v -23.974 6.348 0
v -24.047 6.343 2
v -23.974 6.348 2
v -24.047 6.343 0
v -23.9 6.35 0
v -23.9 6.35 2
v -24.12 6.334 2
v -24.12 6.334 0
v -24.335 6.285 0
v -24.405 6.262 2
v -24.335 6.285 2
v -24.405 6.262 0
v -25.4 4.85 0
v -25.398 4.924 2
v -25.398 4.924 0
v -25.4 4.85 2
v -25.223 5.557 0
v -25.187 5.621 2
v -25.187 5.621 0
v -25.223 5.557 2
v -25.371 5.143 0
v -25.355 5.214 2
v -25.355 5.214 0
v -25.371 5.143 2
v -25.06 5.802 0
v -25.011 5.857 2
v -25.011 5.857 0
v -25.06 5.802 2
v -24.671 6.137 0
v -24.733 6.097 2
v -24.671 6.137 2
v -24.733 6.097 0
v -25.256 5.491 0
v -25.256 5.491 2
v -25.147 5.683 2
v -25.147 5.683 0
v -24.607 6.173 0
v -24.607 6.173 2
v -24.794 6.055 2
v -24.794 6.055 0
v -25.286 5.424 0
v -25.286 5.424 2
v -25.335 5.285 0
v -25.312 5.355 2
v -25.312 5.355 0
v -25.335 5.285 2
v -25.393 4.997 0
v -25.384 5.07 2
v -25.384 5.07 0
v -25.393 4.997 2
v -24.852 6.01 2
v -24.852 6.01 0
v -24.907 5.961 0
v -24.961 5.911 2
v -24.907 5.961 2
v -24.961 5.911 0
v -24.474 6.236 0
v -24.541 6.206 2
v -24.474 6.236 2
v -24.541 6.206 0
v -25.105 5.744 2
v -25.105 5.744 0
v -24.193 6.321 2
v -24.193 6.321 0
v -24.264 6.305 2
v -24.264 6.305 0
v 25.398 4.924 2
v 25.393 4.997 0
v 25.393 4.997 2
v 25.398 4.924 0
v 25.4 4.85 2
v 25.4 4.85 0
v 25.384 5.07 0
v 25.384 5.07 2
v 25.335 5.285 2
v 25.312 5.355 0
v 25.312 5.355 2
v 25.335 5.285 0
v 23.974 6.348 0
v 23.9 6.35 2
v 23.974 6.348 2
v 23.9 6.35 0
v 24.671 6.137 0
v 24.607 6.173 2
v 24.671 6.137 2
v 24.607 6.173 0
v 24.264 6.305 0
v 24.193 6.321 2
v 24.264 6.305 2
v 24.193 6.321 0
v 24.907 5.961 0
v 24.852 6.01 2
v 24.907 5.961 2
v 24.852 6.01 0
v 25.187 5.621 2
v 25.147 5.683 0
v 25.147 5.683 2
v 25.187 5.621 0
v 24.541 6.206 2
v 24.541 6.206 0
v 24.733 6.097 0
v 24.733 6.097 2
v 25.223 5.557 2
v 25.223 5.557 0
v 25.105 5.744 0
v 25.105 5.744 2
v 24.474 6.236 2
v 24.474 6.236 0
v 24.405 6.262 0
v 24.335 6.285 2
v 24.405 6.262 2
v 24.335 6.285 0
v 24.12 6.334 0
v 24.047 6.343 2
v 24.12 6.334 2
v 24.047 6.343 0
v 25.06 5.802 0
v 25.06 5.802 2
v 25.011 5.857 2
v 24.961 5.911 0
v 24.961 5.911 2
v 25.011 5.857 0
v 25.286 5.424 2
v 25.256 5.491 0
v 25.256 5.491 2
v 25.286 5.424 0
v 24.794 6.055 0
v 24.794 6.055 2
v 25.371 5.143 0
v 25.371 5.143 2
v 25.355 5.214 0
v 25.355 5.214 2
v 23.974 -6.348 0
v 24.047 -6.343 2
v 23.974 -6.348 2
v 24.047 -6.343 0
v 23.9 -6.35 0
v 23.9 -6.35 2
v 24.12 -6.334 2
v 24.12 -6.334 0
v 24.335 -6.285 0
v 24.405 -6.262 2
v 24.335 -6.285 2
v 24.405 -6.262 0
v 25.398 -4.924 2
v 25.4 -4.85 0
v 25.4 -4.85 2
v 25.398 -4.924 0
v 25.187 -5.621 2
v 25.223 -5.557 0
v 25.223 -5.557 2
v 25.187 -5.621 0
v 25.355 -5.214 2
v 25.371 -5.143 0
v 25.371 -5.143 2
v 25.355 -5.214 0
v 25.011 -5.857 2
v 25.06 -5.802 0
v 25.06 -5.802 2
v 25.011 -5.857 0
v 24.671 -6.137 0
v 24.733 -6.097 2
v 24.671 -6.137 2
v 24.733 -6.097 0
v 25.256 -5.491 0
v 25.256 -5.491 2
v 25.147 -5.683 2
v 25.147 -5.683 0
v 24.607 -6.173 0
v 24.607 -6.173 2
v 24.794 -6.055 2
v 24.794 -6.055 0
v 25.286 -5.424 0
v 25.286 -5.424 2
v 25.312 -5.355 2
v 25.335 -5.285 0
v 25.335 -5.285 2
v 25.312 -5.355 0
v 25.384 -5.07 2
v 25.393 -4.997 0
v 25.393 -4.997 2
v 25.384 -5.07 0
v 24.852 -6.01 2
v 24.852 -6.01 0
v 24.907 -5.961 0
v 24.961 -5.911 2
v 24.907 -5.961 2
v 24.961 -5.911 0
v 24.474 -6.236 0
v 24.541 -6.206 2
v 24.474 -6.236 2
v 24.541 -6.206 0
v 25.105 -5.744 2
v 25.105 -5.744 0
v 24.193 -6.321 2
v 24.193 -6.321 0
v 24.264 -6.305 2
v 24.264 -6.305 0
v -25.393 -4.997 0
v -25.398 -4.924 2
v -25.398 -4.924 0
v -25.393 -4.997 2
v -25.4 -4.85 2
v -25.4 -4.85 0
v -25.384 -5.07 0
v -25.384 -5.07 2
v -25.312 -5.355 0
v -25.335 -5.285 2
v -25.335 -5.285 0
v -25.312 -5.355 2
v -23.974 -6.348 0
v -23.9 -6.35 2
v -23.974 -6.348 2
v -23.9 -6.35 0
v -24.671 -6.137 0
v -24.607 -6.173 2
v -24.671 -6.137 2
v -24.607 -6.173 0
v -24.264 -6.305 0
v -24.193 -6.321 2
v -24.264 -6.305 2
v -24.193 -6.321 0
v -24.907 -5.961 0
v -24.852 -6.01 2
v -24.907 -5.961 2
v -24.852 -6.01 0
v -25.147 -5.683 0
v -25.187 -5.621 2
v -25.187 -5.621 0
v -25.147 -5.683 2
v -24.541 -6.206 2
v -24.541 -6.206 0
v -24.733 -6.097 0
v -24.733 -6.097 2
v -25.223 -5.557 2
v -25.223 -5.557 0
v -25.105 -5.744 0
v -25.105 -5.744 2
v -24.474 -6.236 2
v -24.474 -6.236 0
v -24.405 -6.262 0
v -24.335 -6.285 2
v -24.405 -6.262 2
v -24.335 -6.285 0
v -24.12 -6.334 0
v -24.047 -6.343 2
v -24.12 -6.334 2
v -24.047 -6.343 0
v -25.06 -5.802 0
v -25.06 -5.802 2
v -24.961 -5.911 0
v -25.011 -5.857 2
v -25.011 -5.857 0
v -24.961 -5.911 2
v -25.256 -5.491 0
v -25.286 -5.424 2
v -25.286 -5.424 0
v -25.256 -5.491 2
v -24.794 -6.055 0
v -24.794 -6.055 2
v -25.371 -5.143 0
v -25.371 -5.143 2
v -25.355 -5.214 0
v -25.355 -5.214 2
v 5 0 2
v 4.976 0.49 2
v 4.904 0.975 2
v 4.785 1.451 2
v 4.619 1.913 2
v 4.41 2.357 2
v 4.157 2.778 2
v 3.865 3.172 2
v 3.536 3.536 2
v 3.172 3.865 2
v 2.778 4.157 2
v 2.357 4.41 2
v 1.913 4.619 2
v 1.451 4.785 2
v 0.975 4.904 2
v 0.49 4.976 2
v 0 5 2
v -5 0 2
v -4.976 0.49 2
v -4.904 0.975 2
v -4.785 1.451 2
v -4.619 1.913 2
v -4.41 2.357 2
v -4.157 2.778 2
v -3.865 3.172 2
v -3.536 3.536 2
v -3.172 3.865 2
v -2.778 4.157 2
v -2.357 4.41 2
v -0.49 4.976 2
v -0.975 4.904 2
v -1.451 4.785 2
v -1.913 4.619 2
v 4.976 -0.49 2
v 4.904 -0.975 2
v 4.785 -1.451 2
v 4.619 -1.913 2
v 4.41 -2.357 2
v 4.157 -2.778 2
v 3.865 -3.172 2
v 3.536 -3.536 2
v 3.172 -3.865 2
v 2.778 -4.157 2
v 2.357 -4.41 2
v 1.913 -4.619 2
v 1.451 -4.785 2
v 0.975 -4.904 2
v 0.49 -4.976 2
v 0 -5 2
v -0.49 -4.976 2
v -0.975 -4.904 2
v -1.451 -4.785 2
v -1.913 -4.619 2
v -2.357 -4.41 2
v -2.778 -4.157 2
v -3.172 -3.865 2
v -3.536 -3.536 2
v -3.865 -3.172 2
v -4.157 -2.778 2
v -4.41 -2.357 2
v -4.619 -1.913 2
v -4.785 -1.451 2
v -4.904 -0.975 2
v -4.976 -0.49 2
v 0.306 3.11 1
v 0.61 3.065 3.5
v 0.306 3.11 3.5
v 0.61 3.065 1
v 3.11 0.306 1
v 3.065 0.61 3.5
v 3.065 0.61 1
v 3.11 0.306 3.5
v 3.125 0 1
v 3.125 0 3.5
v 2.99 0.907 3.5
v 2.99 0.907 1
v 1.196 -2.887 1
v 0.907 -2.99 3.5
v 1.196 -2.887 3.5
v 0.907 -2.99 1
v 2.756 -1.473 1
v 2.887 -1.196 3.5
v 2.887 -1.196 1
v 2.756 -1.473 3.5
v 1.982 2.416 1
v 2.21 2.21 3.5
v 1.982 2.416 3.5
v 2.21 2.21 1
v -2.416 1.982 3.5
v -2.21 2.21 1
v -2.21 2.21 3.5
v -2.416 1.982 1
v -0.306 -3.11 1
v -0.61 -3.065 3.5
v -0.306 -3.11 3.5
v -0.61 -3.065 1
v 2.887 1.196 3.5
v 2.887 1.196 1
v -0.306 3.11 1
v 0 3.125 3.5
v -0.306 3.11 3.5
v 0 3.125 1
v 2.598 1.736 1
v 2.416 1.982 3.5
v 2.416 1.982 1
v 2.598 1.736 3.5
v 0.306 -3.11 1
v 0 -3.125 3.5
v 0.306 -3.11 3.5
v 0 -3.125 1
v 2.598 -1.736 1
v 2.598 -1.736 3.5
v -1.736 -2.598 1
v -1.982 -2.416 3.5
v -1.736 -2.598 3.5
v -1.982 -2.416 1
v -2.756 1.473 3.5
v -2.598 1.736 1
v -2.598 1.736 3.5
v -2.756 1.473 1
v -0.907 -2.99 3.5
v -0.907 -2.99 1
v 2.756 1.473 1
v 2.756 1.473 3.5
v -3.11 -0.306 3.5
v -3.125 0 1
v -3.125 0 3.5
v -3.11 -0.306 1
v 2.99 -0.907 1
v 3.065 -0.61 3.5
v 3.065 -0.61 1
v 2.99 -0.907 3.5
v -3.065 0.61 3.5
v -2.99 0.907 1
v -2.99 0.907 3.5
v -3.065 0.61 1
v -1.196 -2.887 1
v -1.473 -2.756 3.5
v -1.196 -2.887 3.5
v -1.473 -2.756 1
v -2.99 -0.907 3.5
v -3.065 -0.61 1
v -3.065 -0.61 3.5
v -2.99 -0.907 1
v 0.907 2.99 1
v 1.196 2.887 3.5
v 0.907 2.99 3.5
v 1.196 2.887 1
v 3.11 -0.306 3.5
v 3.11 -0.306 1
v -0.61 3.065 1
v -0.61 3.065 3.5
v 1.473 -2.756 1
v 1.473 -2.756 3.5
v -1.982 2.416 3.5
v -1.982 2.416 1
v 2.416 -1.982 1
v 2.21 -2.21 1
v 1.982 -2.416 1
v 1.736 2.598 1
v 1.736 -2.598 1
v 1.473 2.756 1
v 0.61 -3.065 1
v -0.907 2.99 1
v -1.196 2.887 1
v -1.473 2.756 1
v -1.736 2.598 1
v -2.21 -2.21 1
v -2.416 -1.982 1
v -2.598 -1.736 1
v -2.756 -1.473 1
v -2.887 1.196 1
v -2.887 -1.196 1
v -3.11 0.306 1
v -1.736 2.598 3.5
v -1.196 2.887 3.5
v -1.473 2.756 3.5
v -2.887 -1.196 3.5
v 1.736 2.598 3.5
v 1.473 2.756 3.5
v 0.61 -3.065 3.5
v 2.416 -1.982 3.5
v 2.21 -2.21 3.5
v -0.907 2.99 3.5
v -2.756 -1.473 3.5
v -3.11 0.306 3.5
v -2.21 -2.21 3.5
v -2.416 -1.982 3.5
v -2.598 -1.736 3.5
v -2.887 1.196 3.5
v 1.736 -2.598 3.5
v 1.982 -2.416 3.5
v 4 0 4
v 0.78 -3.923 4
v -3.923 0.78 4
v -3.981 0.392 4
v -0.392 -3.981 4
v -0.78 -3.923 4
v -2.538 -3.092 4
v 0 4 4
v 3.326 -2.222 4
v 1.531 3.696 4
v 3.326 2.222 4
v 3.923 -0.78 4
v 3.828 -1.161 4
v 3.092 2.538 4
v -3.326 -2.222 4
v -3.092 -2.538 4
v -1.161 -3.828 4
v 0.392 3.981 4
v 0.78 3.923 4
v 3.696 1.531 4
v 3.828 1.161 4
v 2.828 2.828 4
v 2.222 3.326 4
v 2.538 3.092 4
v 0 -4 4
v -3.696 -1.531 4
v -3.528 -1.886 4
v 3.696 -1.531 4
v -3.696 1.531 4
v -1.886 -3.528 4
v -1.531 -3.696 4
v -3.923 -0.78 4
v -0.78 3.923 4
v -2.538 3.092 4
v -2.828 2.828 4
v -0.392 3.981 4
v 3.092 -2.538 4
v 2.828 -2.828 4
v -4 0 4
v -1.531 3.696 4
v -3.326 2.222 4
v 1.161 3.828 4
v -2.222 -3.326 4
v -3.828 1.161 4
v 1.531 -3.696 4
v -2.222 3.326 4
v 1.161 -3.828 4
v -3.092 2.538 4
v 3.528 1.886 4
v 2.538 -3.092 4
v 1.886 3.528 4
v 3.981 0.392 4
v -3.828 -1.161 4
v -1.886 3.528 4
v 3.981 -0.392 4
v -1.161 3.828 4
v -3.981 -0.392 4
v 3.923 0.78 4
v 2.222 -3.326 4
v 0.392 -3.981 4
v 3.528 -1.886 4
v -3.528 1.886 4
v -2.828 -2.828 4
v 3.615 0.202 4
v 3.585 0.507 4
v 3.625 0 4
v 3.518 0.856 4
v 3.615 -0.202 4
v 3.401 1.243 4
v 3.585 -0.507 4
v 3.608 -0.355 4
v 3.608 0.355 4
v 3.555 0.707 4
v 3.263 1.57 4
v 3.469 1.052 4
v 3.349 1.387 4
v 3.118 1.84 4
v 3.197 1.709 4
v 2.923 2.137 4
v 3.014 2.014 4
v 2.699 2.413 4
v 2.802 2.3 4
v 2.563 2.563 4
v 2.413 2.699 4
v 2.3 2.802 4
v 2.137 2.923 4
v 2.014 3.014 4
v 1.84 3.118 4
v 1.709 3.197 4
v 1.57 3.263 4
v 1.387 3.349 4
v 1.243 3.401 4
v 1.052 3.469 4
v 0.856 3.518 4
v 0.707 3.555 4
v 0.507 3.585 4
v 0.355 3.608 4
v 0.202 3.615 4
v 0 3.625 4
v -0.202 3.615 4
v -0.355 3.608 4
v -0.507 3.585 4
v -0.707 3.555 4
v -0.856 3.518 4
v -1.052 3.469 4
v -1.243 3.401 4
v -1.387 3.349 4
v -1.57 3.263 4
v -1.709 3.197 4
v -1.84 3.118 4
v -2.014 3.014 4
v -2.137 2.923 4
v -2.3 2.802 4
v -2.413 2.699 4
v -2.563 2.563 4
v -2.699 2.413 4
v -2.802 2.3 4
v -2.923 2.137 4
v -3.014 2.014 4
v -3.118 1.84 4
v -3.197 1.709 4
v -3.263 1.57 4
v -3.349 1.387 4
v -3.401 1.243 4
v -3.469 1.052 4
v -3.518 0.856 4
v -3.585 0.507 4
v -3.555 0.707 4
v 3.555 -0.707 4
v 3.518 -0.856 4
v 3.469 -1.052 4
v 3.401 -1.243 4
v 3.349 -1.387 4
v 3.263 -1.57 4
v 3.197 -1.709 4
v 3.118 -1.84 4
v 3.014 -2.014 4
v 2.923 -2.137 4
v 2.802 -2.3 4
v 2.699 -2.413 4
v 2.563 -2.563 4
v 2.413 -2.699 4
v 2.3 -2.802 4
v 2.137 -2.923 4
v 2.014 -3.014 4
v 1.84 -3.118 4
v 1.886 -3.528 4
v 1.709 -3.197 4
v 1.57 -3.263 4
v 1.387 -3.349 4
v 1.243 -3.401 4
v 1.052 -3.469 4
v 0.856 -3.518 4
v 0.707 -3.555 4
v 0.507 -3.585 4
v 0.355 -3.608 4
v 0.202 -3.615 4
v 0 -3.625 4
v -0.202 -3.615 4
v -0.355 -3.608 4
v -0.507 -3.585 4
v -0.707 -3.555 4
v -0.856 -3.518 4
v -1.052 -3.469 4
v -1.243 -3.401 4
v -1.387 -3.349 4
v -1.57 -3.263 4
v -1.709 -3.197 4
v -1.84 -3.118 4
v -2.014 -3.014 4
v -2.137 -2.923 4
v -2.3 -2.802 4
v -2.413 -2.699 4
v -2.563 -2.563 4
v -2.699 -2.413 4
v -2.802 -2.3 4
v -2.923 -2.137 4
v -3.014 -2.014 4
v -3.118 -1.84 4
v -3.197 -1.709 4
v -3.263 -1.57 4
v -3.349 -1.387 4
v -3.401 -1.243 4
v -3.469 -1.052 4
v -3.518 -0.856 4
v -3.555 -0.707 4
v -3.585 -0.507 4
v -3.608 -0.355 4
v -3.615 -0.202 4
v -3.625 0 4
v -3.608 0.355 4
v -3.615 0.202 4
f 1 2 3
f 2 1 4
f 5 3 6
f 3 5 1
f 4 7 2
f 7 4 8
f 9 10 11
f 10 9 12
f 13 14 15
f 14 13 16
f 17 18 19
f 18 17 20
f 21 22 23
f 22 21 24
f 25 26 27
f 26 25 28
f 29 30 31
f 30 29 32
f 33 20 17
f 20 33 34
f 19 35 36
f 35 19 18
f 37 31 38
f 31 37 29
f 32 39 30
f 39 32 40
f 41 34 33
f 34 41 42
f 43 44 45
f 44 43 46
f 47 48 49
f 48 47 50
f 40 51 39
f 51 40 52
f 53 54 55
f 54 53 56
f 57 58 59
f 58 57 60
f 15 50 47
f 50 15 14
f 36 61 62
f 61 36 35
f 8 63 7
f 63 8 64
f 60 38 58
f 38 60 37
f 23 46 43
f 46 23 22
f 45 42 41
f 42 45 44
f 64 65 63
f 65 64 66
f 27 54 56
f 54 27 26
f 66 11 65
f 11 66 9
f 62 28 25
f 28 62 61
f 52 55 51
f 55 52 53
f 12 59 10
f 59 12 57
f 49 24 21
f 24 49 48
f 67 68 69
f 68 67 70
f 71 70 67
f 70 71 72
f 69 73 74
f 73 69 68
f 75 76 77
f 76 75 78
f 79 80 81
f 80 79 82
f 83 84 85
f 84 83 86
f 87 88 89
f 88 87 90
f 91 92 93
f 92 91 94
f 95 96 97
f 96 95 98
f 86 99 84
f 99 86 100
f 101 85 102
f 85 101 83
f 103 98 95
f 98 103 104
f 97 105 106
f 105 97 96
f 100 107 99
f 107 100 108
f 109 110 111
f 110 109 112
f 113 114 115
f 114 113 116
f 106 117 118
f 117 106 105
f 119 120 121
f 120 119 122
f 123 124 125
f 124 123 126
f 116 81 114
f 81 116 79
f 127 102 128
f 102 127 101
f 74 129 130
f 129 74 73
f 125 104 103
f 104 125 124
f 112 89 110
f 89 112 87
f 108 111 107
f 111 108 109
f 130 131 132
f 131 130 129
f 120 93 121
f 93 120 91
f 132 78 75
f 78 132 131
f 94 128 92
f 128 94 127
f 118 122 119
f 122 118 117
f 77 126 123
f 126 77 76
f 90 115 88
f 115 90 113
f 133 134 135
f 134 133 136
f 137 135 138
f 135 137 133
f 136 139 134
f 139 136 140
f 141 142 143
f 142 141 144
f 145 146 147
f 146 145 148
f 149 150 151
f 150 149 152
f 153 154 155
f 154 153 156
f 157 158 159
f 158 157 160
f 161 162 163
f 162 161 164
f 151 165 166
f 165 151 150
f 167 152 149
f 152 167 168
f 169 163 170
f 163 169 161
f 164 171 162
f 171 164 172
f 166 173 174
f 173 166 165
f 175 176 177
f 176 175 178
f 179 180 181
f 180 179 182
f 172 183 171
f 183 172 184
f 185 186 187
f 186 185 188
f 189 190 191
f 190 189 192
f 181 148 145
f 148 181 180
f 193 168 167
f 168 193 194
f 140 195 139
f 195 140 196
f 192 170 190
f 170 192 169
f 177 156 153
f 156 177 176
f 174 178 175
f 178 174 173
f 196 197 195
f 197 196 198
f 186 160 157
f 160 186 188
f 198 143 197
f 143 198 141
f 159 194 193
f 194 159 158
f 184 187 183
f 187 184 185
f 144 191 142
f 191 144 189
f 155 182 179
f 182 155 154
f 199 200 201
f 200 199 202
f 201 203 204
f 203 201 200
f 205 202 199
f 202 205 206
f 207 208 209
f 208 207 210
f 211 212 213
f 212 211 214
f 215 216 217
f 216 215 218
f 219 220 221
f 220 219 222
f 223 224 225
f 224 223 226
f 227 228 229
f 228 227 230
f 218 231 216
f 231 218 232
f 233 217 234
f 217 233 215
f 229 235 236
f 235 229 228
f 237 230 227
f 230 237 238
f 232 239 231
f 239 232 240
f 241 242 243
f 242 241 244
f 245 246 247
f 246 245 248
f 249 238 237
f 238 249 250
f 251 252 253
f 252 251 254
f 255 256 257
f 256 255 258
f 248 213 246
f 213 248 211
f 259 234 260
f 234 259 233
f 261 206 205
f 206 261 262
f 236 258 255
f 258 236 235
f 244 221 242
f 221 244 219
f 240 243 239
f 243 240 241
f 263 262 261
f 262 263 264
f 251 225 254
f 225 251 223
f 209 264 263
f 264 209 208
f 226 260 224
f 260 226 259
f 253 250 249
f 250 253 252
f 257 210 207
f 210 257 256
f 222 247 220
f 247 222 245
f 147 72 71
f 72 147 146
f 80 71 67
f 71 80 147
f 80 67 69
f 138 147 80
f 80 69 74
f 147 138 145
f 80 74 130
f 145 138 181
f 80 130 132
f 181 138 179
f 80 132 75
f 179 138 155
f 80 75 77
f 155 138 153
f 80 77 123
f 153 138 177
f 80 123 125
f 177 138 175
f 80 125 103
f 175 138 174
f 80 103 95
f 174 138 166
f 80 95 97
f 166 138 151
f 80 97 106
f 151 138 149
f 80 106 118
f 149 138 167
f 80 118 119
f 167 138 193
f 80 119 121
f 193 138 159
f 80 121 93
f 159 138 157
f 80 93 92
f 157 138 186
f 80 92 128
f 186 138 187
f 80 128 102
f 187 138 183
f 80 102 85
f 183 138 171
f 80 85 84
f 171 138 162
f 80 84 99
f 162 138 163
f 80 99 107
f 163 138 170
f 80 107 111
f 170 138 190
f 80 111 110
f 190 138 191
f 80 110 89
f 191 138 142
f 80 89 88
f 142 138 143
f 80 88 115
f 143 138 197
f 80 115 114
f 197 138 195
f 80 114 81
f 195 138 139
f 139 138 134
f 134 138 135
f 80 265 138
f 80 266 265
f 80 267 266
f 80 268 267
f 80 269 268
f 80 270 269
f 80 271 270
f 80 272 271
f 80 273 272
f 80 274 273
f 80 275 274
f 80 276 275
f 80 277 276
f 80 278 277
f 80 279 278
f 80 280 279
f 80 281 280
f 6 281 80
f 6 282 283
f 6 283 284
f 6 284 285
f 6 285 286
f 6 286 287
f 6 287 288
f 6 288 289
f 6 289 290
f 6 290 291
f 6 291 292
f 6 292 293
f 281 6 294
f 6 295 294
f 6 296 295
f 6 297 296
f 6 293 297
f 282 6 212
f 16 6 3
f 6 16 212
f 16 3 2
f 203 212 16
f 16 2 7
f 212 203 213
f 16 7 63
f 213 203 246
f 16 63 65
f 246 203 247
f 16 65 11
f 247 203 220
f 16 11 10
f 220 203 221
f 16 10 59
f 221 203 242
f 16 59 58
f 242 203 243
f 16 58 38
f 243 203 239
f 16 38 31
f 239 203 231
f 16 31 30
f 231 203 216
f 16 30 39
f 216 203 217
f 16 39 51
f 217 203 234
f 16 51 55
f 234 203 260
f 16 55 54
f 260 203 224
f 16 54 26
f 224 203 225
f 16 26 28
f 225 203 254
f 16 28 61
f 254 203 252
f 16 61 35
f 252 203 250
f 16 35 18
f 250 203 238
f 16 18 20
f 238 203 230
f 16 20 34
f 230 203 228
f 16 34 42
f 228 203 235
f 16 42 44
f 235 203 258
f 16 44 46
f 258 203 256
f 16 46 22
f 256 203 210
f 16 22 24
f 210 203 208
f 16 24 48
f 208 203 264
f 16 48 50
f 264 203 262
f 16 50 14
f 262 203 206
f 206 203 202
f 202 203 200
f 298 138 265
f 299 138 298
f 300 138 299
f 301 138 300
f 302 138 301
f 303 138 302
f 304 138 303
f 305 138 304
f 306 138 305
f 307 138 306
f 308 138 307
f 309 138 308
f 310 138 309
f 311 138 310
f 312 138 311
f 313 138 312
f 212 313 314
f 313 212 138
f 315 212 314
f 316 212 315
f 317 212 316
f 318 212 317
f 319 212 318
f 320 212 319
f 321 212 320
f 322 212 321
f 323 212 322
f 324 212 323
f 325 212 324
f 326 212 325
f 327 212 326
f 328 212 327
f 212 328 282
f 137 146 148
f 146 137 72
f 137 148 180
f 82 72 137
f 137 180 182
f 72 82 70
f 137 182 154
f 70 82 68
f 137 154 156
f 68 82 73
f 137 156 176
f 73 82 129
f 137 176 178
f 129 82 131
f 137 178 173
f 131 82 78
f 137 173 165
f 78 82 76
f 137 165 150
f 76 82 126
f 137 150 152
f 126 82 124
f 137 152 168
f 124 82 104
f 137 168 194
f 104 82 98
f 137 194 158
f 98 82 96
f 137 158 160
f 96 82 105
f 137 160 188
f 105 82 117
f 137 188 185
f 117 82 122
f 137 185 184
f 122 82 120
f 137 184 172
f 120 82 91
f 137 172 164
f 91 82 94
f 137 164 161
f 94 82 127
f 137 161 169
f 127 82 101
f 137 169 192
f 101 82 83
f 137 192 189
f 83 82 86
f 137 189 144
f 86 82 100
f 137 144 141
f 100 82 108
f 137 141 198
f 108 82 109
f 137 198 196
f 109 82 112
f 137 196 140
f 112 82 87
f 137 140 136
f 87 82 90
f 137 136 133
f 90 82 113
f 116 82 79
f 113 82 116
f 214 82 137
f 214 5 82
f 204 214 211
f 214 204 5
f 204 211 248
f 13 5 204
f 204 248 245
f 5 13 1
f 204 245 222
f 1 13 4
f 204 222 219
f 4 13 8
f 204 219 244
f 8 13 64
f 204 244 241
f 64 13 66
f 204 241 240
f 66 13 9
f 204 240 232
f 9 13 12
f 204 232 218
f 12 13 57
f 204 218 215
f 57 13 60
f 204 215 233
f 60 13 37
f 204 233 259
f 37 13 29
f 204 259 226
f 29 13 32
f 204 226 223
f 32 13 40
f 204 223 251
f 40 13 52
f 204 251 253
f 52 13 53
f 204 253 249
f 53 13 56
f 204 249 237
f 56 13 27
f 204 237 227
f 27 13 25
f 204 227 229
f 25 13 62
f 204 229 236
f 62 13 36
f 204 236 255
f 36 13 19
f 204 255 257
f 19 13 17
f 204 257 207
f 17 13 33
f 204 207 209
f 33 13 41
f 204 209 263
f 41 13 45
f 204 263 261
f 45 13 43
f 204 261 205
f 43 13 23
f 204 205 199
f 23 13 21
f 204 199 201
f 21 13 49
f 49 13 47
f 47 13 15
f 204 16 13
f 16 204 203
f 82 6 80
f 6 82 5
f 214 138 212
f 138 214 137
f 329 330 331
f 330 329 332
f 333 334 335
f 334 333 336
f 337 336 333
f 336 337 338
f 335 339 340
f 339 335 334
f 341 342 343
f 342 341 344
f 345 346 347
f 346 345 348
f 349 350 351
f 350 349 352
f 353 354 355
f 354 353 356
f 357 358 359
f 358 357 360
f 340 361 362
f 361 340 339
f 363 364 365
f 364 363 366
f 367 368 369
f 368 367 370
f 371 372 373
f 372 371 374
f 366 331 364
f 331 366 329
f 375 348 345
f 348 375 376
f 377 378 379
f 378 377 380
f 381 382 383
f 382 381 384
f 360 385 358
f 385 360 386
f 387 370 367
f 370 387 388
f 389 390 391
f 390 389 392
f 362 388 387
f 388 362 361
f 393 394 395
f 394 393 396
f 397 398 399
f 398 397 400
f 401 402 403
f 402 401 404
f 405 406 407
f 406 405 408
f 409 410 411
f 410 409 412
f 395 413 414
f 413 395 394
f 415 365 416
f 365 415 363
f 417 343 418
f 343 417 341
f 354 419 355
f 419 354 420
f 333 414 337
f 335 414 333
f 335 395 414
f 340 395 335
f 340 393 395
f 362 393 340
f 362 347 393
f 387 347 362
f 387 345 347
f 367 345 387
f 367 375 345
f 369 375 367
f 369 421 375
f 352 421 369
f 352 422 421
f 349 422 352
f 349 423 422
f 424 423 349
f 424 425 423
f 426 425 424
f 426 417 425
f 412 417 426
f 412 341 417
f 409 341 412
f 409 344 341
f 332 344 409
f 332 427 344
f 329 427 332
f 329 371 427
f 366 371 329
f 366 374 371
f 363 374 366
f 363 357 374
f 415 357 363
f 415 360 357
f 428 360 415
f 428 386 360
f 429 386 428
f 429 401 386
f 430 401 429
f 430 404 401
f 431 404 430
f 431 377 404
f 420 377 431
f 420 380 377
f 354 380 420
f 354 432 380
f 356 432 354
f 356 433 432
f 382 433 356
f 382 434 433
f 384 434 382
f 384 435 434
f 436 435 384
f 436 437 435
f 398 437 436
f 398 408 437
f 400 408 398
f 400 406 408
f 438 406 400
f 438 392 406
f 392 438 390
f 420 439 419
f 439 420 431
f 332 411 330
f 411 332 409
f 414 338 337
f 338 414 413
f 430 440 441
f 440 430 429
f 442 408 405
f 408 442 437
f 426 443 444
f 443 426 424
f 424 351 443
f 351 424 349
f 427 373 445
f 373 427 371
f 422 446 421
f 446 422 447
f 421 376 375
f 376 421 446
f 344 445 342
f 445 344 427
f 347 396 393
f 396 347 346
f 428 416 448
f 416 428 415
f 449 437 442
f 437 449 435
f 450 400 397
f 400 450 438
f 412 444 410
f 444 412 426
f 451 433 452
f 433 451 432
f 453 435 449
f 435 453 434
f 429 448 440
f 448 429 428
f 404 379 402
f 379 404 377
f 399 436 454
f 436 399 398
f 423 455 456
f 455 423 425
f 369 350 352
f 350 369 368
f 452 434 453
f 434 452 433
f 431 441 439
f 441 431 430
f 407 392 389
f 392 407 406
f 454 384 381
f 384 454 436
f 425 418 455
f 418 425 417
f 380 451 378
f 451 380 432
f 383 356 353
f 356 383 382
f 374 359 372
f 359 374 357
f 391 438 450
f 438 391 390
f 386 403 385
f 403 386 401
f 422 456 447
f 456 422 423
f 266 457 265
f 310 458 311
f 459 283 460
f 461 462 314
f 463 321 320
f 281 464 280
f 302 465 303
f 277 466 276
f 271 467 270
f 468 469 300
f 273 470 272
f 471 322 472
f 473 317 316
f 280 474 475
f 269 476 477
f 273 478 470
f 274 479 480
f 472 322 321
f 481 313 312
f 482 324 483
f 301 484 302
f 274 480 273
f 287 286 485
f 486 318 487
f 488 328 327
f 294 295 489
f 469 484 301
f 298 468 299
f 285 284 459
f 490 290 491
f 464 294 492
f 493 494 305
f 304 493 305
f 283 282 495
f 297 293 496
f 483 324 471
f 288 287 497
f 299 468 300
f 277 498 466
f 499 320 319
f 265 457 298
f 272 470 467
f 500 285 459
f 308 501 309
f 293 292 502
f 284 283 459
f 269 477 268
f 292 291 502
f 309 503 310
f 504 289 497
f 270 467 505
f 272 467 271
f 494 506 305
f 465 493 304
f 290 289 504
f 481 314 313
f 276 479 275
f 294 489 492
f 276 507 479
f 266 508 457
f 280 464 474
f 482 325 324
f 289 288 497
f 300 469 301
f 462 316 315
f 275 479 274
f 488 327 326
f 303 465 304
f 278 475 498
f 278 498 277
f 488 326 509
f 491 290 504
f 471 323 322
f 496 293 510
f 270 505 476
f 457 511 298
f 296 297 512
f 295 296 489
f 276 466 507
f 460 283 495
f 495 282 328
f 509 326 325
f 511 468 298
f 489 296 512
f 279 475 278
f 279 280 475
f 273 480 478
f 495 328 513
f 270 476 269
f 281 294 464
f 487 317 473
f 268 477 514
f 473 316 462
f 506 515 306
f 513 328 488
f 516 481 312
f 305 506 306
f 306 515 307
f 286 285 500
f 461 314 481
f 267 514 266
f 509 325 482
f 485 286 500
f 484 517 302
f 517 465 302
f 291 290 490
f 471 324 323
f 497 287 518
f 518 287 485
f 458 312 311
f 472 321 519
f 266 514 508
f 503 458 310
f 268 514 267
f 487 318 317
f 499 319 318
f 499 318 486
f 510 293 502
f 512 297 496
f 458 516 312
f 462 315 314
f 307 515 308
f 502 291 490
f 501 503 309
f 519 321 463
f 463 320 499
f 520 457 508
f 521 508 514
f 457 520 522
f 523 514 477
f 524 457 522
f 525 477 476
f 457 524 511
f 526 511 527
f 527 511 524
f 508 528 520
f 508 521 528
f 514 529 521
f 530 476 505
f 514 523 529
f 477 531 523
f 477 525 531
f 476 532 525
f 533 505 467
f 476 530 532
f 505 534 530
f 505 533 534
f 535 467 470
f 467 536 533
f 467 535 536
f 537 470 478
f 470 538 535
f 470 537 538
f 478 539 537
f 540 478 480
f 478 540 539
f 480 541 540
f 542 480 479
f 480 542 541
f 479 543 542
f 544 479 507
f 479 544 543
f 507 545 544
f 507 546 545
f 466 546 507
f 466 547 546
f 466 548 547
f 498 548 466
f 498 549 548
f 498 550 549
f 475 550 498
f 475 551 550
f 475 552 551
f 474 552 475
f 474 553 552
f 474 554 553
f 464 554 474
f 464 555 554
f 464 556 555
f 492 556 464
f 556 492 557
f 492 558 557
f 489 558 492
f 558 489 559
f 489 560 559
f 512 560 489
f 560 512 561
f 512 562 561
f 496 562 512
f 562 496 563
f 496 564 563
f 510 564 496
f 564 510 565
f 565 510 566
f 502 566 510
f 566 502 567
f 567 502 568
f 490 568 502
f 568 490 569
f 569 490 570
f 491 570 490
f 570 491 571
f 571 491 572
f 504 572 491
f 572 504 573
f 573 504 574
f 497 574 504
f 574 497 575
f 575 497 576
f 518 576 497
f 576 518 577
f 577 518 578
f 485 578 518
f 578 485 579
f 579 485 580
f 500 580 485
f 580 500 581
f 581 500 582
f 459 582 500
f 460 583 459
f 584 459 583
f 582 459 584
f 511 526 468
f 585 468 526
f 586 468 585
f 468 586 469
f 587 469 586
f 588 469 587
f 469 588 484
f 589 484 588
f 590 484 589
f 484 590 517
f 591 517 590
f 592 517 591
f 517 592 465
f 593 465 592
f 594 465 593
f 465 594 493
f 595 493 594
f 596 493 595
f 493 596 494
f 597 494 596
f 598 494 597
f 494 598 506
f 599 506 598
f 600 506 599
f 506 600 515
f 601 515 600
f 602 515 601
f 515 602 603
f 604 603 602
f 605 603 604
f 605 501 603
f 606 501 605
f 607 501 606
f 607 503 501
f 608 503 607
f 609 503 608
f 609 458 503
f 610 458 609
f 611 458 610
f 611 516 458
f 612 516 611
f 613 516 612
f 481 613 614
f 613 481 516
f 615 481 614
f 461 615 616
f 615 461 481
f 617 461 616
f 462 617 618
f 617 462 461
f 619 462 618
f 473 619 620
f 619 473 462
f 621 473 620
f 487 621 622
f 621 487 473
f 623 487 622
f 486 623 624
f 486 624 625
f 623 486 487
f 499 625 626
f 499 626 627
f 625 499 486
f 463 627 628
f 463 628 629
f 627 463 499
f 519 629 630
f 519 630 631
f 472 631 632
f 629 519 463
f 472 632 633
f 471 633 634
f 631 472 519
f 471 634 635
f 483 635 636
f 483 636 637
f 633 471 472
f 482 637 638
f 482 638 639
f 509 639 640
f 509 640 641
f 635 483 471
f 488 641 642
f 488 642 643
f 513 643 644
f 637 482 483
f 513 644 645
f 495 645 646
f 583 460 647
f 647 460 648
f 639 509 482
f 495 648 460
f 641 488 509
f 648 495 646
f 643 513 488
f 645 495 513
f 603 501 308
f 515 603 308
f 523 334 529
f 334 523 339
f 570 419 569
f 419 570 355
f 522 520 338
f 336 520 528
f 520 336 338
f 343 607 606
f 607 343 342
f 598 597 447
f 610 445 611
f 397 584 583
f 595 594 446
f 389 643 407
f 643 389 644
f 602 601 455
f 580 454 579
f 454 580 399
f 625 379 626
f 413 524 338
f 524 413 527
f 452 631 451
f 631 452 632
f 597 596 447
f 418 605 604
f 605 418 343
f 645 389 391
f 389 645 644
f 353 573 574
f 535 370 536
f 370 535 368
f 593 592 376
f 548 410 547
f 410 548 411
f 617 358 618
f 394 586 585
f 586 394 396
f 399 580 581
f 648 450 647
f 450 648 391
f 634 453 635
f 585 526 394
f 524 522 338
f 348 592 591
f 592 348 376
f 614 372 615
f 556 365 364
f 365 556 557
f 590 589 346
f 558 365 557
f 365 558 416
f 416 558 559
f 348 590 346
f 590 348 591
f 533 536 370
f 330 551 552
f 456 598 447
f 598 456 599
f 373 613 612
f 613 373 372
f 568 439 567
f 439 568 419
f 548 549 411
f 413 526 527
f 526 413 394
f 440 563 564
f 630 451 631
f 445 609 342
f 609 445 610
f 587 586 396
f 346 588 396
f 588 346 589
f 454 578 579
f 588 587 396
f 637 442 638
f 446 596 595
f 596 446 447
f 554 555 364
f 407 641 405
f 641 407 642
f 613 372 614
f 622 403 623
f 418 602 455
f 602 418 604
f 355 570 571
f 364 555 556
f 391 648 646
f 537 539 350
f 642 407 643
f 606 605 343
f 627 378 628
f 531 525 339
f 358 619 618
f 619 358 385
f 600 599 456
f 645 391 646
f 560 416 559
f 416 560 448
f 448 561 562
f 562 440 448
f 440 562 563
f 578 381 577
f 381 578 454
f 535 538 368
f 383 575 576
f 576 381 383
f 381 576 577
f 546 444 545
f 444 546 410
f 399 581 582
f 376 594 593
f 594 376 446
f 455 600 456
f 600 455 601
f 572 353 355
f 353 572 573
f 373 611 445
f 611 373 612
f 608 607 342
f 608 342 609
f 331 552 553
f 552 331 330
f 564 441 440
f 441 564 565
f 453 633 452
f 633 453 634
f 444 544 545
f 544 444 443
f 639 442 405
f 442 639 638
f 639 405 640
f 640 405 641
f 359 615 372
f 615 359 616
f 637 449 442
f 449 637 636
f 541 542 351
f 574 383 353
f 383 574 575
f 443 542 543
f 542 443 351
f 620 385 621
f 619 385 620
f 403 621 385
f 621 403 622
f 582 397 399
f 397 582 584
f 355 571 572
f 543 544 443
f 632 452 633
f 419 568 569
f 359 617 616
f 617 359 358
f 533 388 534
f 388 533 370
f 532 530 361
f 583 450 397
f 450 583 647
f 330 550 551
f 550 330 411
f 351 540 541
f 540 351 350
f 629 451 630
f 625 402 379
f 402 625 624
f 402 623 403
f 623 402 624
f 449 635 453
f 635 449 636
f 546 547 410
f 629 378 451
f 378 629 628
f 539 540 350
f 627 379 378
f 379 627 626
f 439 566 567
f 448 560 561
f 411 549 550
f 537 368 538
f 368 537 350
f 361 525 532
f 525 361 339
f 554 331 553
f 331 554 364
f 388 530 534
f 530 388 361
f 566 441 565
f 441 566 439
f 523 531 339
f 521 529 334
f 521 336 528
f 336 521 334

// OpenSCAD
//All values are in millimeters

//Set length of label face plate
plate_length = 50.8;

//Set height of faceplate
plate_height = 12.7;

//Set thickness of faceplate. 2 is typically sufficient.
plate_thickness = 2;

//Set corner radius of faceplate
corner_radius = 1.5;

//Set diameter of magnet
magnet_diameter = 6;

//Set thickness of magnet
magnet_thickness = 3;

//Set extra tolerance for magnet hole in mm. If set to zero, hole will be exactly the same as your magnet diameter. This really depends on your printer calibration. If you can't get your magnets into the hole, increase this number in 0.25 increments.
hole_tolerance = 0.25;






//Code below this line should be left alone unless you know what you're doing.


//Number of fragments for circles
$fn = 64;

// Determine starting point on Z axis of magnet hole
inset = (plate_thickness-1)>magnet_thickness ? plate_thickness-magnet_thickness : 1;

// Draw face plate including magnet cutout if required.
difference(){
 
 // Rectangle with rounded corners
    translate([-plate_length/2, -plate_height/2, 0]) { roundedCube([plate_length, plate_height, plate_thickness], r=corner_radius); }
// Cylinder cutout if needed based on inset and magnet diameter
    translate([0,0,inset])cylinder(d = magnet_diameter+hole_tolerance,h = plate_thickness);
}

// Draw magnet protrusion if needed
difference(){

// Outside tapered cylinder
translate([0,0,plate_thickness])cylinder(d1 = magnet_diameter+4,d2 = magnet_diameter+2,h = magnet_thickness-(plate_thickness-inset));

// Cutout for magnet
translate([0,0,plate_thickness-inset])cylinder(d = magnet_diameter + hole_tolerance,h = magnet_thickness-(plate_thickness-inset)+2);

// Magnet hole inside taper
translate([0,0,(magnet_thickness-0.5-(plate_thickness-1)+plate_thickness)])cylinder(d1 = magnet_diameter+hole_tolerance,d2 = magnet_diameter+hole_tolerance+2,h = 1);
}




module roundedCube(dim, r=1, x=false, y=false, z=true, xcorners=[true,true,true,true], ycorners=[true,true,true,true], zcorners=[true,true,true,true], center=false, rx=[undef, undef, undef, undef], ry=[undef, undef, undef, undef], rz=[undef, undef, undef, undef], $fn=128)
{
	translate([(center==true ? (-(dim[0]/2)) : 0), (center==true ? (-(dim[1]/2)) : 0), (center==true ? (-(dim[2]/2)) : 0)])
	{
		difference()
		{
			cube(dim);

			if(z)
			{
				translate([0, 0, -0.1])
				{
					if(zcorners[0])
						translate([0, dim[1]-(rz[0]==undef ? r : rz[0])]) { rotateAround([0, 0, 90], [(rz[0]==undef ? r : rz[0])/2, (rz[0]==undef ? r : rz[0])/2, 0]) { meniscus(h=dim[2], r=(rz[0]==undef ? r : rz[0]), fn=$fn); } }
					if(zcorners[1])
						translate([dim[0]-(rz[1]==undef ? r : rz[1]), dim[1]-(rz[1]==undef ? r : rz[1])]) { meniscus(h=dim[2], r=(rz[1]==undef ? r : rz[1]), fn=$fn); }
					if(zcorners[2])
						translate([dim[0]-(rz[2]==undef ? r : rz[2]), 0]) { rotateAround([0, 0, -90], [(rz[2]==undef ? r : rz[2])/2, (rz[2]==undef ? r : rz[2])/2, 0]) { meniscus(h=dim[2], r=(rz[2]==undef ? r : rz[2]), fn=$fn); } }
					if(zcorners[3])
						rotateAround([0, 0, -180], [(rz[3]==undef ? r : rz[3])/2, (rz[3]==undef ? r : rz[3])/2, 0]) { meniscus(h=dim[2], r=(rz[3]==undef ? r : rz[3]), fn=$fn); }
				}
			}

			if(y)
			{
				translate([0, -0.1, 0])
				{
					if(ycorners[0])
						translate([0, 0, dim[2]-(ry[0]==undef ? r : ry[0])]) { rotateAround([0, 180, 0], [(ry[0]==undef ? r : ry[0])/2, 0, (ry[0]==undef ? r : ry[0])/2]) { rotateAround([-90, 0, 0], [0, (ry[0]==undef ? r : ry[0])/2, (ry[0]==undef ? r : ry[0])/2]) { meniscus(h=dim[1], r=(ry[0]==undef ? r : ry[0])); } } }
					if(ycorners[1])
						translate([dim[0]-(ry[1]==undef ? r : ry[1]), 0, dim[2]-(ry[1]==undef ? r : ry[1])]) { rotateAround([0, -90, 0], [(ry[1]==undef ? r : ry[1])/2, 0, (ry[1]==undef ? r : ry[1])/2]) { rotateAround([-90, 0, 0], [0, (ry[1]==undef ? r : ry[1])/2, (ry[1]==undef ? r : ry[1])/2]) { meniscus(h=dim[1], r=(ry[1]==undef ? r : ry[1])); } } }
					if(ycorners[2])
						translate([dim[0]-(ry[2]==undef ? r : ry[2]), 0]) { rotateAround([-90, 0, 0], [0, (ry[2]==undef ? r : ry[2])/2, (ry[2]==undef ? r : ry[2])/2]) { meniscus(h=dim[1], r=(ry[2]==undef ? r : ry[2])); } }
					if(ycorners[3])
						rotateAround([0, 90, 0], [(ry[3]==undef ? r : ry[3])/2, 0, (ry[3]==undef ? r : ry[3])/2]) { rotateAround([-90, 0, 0], [0, (ry[3]==undef ? r : ry[3])/2, (ry[3]==undef ? r : ry[3])/2]) { meniscus(h=dim[1], r=(ry[3]==undef ? r : ry[3])); } }
				}
			}

			if(x)
			{
				translate([-0.1, 0, 0])
				{
					if(xcorners[0])
						translate([0, dim[1]-(rx[0]==undef ? r : rx[0])]) { rotateAround([0, 90, 0], [(rx[0]==undef ? r : rx[0])/2, 0, (rx[0]==undef ? r : rx[0])/2]) { meniscus(h=dim[0], r=(rx[0]==undef ? r : rx[0])); } }
					if(xcorners[1])
						translate([0, dim[1]-(rx[1]==undef ? r : rx[1]), dim[2]-(rx[1]==undef ? r : rx[1])]) { rotateAround([90, 0, 0], [0, (rx[1]==undef ? r : rx[1])/2, (rx[1]==undef ? r : rx[1])/2]) { rotateAround([0, 90, 0], [(rx[1]==undef ? r : rx[1])/2, 0, (rx[1]==undef ? r : rx[1])/2]) { meniscus(h=dim[0], r=(rx[1]==undef ? r : rx[1])); } } }
					if(xcorners[2])
						translate([0, 0, dim[2]-(rx[2]==undef ? r : rx[2])]) { rotateAround([180, 0, 0], [0, (rx[2]==undef ? r : rx[2])/2, (rx[2]==undef ? r : rx[2])/2]) { rotateAround([0, 90, 0], [(rx[2]==undef ? r : rx[2])/2, 0, (rx[2]==undef ? r : rx[2])/2]) { meniscus(h=dim[0], r=(rx[2]==undef ? r : rx[2])); } } }
					if(xcorners[3])
						rotateAround([-90, 0, 0], [0, (rx[3]==undef ? r : rx[3])/2, (rx[3]==undef ? r : rx[3])/2]) { rotateAround([0, 90, 0], [(rx[3]==undef ? r : rx[3])/2, 0, (rx[3]==undef ? r : rx[3])/2]) { meniscus(h=dim[0], r=(rx[3]==undef ? r : rx[3])); } }
				}
			}
		}
	}
}

module meniscus(h, r, fn=128)
{
	$fn=fn;

	difference()
	{
		cube([r+0.2, r+0.2, h+0.2]);
		translate([0, 0, -0.1]) { cylinder(h=h+0.4, r=r); }
	}
}

module rotateAround(a, v) { translate(v) { rotate(a) { translate(-v) { children(); } } } }
